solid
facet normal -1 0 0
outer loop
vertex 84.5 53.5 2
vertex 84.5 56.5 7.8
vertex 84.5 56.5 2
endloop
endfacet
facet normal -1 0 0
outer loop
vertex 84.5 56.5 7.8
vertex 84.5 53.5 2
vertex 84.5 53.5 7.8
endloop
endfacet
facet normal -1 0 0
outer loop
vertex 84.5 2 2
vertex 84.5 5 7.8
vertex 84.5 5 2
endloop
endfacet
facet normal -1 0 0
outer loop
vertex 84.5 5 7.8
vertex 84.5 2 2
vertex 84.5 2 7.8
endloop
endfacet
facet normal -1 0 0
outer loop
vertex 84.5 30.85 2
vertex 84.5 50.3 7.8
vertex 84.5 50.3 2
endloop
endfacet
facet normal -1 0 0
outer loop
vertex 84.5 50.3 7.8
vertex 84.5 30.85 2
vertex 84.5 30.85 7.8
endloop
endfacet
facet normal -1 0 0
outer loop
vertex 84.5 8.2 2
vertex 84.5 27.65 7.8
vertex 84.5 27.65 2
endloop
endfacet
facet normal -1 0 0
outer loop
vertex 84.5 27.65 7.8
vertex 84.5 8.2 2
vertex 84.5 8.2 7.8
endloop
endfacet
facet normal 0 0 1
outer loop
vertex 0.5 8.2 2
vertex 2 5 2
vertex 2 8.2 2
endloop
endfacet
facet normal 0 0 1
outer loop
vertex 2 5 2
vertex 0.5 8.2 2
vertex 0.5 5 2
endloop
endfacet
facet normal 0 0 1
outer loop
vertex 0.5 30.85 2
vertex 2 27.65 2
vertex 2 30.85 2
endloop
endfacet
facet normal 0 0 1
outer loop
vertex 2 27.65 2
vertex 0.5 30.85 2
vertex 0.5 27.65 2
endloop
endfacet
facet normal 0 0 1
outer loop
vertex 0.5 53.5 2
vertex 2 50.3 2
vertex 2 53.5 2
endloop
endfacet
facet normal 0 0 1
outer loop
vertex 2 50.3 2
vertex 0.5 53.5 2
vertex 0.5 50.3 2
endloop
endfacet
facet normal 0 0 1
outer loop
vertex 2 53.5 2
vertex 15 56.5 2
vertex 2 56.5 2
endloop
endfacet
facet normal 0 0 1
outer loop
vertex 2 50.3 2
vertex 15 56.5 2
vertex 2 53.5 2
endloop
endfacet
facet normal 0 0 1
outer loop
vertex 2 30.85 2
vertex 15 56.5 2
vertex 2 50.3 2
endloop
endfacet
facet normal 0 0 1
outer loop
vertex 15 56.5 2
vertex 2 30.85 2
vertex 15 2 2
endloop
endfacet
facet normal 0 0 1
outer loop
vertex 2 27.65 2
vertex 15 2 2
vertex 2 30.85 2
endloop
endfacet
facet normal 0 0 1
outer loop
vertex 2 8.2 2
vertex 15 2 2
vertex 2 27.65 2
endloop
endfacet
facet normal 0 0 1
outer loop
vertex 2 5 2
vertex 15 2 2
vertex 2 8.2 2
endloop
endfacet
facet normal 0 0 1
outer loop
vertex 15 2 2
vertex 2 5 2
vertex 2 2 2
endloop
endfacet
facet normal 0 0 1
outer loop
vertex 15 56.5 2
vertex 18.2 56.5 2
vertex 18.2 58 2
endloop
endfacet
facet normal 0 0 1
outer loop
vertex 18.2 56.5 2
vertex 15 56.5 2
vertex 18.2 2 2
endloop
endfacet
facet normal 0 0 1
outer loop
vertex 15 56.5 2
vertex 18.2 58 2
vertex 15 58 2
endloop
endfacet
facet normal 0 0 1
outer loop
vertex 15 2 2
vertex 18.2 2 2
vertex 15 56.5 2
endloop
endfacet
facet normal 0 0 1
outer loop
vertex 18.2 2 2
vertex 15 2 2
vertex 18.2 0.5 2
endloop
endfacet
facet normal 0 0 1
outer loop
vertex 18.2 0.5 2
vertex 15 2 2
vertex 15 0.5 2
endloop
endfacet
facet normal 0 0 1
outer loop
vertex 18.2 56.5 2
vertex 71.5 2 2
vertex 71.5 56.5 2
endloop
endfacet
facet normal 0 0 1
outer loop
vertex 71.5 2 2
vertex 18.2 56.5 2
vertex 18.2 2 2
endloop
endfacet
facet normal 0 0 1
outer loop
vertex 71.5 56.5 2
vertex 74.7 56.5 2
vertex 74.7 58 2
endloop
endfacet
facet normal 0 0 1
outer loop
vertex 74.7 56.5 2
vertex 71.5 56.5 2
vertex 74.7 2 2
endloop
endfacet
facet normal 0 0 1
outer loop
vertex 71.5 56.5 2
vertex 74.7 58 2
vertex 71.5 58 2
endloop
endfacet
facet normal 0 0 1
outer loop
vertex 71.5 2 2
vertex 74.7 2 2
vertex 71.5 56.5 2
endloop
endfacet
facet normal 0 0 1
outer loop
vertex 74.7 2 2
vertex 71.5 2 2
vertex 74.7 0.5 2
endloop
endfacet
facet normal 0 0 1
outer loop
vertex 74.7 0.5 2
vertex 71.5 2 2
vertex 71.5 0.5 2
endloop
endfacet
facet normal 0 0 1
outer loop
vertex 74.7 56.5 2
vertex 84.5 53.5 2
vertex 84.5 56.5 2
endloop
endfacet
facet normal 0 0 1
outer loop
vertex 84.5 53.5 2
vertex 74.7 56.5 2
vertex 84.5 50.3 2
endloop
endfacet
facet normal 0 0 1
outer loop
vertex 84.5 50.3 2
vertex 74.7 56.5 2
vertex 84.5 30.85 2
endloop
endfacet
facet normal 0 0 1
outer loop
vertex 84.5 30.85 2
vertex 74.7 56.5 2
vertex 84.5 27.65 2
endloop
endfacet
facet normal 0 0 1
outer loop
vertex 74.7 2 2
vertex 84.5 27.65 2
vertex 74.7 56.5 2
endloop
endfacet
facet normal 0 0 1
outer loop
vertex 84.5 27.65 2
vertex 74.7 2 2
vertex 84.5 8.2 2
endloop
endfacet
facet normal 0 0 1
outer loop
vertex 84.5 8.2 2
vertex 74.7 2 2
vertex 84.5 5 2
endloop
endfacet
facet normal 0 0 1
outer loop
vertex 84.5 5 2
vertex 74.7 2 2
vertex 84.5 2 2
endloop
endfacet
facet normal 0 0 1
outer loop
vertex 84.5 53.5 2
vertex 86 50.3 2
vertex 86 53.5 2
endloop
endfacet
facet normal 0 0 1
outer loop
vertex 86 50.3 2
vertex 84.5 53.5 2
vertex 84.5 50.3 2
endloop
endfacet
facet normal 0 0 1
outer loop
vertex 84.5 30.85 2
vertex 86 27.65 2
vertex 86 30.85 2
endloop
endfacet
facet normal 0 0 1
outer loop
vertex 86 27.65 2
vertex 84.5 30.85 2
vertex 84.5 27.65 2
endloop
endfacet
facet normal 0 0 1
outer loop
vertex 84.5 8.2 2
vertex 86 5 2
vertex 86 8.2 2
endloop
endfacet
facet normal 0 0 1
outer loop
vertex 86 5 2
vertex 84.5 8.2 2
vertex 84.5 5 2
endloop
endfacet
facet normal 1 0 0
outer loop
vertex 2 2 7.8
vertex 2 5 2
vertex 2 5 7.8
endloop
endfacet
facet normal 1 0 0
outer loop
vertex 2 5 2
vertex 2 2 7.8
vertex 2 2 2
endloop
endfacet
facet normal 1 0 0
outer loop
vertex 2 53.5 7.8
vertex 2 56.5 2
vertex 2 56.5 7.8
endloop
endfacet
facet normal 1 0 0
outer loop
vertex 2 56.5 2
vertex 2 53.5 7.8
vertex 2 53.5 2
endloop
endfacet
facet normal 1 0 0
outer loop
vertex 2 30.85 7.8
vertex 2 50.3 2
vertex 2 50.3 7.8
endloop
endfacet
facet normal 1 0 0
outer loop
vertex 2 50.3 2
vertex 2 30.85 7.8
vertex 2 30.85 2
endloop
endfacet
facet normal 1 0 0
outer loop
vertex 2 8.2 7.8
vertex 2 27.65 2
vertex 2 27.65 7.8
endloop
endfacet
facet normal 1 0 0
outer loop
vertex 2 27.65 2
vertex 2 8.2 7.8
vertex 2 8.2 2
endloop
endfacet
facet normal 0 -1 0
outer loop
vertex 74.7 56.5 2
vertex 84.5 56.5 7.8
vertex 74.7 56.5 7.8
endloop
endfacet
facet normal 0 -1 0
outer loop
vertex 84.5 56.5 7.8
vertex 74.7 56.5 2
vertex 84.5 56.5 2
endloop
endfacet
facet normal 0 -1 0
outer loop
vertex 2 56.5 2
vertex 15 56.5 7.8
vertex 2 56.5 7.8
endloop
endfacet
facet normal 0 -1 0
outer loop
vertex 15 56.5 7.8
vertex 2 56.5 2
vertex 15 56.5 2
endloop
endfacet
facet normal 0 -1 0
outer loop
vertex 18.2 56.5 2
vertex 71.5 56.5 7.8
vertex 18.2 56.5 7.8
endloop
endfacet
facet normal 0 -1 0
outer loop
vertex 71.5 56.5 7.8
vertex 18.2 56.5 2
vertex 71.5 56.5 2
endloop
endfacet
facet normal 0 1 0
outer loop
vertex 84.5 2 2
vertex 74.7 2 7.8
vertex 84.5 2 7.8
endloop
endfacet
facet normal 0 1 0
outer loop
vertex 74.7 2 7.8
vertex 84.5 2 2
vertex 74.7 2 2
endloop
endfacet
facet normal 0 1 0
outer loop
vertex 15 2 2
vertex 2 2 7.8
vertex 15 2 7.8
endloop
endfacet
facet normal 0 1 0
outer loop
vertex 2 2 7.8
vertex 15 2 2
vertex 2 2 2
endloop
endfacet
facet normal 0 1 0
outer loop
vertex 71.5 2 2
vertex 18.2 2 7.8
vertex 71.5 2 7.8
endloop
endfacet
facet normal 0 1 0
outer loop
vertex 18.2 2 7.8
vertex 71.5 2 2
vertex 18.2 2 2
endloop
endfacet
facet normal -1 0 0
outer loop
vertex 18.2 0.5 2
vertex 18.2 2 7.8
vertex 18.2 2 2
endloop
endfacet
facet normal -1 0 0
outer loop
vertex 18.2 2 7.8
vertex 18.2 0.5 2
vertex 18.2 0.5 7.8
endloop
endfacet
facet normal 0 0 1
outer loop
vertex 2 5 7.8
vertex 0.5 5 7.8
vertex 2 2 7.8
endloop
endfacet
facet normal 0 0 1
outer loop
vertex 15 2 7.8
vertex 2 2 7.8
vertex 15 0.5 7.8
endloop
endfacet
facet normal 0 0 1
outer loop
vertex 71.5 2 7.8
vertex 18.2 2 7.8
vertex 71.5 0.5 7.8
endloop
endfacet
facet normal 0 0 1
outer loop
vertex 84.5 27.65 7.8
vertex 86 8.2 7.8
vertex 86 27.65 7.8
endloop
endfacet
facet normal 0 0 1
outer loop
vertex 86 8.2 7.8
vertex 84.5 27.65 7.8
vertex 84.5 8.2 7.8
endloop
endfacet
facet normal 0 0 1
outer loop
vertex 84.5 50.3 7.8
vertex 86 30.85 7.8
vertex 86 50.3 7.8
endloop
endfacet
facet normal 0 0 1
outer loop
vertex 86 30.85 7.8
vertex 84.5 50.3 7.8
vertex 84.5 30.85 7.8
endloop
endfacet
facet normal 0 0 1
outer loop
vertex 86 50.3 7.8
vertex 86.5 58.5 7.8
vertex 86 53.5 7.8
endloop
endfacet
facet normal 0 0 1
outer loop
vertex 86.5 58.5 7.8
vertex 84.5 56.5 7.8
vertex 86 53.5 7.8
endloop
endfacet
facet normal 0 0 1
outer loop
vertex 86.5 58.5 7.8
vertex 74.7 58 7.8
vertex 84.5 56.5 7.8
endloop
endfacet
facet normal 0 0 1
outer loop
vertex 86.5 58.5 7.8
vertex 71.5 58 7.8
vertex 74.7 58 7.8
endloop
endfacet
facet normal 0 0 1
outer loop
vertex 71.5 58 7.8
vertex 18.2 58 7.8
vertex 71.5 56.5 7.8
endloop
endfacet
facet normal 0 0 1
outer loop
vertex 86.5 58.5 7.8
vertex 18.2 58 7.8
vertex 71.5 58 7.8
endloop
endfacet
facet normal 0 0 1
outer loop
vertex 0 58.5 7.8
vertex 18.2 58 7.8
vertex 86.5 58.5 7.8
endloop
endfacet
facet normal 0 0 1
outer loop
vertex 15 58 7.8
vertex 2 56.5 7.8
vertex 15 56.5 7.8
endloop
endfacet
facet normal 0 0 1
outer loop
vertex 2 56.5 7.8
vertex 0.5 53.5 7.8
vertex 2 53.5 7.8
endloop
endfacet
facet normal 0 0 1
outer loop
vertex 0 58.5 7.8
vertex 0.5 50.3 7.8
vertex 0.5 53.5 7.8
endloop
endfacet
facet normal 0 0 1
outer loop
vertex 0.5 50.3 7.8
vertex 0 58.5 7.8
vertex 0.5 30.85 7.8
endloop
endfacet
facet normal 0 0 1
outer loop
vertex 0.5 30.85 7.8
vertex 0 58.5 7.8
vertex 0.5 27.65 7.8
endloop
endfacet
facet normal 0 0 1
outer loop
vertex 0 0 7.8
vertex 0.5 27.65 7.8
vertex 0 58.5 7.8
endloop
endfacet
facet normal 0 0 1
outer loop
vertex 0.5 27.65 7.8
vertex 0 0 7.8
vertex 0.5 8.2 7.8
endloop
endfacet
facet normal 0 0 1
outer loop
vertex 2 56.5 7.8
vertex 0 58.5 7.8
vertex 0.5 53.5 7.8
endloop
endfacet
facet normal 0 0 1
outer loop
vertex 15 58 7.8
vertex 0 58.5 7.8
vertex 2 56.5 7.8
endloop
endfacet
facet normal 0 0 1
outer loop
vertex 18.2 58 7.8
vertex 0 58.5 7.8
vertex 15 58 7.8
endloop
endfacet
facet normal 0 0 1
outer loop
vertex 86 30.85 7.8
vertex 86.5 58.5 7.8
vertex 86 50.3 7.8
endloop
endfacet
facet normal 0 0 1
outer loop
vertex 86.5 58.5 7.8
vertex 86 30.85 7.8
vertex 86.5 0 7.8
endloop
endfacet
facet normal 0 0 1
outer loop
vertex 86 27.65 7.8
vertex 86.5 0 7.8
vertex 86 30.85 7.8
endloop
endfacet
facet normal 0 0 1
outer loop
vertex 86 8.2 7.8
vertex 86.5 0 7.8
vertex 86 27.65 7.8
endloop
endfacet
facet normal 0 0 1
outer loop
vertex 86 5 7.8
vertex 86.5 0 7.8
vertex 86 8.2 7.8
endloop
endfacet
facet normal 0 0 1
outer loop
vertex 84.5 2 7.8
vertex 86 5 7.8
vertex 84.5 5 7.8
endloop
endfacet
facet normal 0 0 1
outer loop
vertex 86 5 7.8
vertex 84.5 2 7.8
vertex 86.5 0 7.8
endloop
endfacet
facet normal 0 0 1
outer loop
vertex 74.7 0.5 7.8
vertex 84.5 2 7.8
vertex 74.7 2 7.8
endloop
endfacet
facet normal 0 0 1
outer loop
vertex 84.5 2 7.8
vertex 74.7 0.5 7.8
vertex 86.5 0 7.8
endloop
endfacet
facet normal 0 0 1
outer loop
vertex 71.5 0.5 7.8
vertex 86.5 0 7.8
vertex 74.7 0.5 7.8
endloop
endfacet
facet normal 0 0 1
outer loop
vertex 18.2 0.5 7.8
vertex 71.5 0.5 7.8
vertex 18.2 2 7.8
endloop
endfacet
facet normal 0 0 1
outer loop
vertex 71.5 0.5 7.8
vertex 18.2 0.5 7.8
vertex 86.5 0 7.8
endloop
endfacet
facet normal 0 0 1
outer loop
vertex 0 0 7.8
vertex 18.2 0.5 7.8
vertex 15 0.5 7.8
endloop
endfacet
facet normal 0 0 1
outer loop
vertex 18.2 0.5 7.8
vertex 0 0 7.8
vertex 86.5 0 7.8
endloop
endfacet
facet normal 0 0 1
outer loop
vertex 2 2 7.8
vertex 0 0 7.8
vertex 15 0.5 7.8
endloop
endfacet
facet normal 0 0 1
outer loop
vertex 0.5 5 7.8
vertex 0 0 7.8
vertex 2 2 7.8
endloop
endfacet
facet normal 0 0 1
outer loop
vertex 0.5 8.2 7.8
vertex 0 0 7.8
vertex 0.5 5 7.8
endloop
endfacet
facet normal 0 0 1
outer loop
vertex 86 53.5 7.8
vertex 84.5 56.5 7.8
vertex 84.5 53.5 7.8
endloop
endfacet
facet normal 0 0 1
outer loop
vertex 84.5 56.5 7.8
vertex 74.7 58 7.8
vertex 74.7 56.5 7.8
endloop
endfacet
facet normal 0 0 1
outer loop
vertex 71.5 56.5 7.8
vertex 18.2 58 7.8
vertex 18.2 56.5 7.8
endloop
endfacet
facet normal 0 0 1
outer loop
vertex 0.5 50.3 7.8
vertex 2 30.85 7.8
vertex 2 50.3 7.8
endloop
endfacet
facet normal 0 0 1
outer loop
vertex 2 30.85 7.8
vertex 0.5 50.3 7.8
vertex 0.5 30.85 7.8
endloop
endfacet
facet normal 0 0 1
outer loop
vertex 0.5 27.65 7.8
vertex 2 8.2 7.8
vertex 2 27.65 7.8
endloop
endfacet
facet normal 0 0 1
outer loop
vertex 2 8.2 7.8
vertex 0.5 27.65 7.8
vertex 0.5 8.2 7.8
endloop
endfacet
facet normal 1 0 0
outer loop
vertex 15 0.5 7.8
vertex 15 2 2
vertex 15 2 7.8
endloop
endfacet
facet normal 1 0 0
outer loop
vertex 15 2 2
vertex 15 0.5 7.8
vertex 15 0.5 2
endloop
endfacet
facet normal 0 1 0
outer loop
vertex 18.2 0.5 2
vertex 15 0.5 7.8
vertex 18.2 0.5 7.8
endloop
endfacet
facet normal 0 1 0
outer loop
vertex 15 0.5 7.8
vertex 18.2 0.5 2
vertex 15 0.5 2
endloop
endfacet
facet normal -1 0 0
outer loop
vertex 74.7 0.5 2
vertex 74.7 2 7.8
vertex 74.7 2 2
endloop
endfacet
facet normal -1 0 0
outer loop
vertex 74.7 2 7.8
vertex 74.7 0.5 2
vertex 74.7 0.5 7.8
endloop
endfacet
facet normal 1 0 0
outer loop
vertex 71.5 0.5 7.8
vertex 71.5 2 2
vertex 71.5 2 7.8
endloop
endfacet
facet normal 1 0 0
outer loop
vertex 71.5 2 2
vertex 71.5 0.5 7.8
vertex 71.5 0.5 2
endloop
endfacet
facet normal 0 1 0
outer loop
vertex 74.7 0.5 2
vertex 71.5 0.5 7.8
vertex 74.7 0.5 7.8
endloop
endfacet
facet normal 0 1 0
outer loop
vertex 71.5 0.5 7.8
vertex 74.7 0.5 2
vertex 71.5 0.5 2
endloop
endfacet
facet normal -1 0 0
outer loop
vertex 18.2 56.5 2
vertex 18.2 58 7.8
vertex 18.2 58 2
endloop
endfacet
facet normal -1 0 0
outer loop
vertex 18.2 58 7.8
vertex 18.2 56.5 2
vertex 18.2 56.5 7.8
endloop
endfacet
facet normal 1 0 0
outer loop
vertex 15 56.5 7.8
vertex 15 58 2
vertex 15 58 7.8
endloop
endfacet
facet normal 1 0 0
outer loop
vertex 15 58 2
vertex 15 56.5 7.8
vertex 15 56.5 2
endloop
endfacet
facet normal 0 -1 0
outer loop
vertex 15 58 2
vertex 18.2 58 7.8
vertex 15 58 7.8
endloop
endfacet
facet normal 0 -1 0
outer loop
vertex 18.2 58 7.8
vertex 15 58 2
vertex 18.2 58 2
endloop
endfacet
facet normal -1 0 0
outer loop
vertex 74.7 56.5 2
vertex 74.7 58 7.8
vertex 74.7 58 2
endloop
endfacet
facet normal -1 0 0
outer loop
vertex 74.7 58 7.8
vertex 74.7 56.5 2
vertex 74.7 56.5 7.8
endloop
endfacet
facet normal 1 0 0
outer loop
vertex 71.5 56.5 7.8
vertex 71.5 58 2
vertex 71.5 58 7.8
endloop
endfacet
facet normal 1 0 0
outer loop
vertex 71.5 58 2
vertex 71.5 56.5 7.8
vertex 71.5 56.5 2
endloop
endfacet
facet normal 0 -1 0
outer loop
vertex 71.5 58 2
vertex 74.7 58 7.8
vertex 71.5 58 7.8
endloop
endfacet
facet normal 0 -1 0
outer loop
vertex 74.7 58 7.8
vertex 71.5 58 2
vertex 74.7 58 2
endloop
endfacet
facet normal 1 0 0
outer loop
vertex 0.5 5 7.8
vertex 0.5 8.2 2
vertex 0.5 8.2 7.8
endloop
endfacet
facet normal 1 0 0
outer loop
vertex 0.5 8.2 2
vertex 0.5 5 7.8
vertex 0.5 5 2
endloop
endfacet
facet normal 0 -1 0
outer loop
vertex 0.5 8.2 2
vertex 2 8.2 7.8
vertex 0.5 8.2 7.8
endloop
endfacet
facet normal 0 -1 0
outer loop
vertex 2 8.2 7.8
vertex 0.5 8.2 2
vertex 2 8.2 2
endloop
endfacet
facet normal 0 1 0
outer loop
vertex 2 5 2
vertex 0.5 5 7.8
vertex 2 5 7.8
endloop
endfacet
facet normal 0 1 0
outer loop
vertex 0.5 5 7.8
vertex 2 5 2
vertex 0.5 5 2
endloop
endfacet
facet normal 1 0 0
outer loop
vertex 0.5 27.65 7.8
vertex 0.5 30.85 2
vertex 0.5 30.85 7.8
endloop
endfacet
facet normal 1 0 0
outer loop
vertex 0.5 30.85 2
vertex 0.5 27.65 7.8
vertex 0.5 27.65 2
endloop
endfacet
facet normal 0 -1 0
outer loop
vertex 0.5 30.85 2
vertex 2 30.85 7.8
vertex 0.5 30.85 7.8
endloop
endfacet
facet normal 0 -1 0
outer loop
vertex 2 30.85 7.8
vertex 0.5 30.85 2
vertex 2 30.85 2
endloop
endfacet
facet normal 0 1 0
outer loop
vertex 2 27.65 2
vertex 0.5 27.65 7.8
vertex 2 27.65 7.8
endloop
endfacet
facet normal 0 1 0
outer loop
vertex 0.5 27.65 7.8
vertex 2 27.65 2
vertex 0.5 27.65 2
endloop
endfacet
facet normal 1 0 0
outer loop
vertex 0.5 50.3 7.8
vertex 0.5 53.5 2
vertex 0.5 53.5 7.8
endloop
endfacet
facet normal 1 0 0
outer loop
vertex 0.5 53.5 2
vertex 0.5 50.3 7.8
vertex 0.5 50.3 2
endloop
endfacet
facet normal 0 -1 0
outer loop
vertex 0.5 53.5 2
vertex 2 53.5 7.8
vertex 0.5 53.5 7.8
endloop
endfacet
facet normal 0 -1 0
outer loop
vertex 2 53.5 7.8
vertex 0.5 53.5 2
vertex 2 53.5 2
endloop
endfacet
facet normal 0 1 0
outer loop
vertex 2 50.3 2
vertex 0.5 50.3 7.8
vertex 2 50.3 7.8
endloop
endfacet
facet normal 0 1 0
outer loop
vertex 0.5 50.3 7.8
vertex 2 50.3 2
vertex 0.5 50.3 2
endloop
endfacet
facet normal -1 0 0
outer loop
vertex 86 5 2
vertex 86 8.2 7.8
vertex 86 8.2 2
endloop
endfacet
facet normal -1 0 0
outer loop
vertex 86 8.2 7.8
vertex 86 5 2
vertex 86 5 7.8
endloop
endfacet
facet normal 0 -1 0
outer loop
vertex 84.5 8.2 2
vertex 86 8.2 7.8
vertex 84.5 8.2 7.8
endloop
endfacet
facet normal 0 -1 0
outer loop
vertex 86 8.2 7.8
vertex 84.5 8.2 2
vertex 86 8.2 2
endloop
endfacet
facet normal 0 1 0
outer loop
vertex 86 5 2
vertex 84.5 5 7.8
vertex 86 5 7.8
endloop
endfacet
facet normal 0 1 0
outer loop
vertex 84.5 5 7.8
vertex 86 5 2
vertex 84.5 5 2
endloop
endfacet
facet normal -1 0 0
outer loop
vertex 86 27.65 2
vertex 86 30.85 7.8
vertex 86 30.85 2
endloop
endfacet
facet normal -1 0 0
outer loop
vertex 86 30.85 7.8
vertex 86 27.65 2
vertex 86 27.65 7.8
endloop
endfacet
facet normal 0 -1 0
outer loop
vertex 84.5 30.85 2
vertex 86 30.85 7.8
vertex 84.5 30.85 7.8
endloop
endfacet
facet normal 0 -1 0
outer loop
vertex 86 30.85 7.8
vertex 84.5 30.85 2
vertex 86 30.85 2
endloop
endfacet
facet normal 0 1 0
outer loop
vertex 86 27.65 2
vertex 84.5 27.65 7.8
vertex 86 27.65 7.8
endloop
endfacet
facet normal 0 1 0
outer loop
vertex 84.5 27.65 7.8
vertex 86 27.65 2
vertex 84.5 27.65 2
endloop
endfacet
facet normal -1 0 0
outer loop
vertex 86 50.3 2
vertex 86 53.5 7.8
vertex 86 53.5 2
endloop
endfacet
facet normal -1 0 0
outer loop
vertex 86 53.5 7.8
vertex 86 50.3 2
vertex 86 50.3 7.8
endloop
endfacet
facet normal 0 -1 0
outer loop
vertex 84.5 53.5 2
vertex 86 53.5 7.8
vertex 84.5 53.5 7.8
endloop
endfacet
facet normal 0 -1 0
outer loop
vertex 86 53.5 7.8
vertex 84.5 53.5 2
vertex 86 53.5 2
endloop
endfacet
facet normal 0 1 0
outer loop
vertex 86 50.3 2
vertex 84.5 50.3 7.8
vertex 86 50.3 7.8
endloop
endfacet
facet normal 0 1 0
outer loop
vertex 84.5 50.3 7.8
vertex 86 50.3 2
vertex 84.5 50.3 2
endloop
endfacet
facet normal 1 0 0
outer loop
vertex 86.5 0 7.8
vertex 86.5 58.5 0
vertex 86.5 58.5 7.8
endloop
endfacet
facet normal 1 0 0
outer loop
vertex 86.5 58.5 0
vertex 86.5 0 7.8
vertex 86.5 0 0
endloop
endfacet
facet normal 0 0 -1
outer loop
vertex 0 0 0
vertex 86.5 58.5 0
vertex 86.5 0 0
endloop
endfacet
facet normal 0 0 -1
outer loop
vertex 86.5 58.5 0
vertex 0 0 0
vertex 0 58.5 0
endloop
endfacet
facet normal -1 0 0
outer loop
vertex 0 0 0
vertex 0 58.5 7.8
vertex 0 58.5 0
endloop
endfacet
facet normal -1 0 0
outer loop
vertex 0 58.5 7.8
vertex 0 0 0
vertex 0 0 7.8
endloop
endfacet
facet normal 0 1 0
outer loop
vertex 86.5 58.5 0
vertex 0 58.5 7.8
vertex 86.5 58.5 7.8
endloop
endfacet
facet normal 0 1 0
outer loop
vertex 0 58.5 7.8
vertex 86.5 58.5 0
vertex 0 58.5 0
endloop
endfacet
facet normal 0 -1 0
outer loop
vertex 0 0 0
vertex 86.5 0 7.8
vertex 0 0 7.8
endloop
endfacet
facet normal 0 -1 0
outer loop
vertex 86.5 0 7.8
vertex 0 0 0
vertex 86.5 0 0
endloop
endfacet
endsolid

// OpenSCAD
// file: breadboard.scad
/*
 * Breadboad
 * from: https://github.com/rlerdorf/BBBox
 */

/* [Box dimensions] */
Thick        = 2; // Wall thickness. If you change this you will have to adjust a few things

/* [Box options] */
m           = 0.9; // Tolerance (Panels/rails gap)

/* BreadBoard Mount */
BBMount   =  1;

BBPosX    = 2;
BBPosY    = 2;
BBLength  = 82.5;
BBHeight  =  9.5;
BBWidth   = 54.5;
TabWidth  =  3.2; // These tabs tend to vary from one brand to another. Measure carefully!
TabDepth  =  1.5;
TabHeight =  5.8;

module BBTabs() {
    //translate([Thick+2*m + 0.1, 2*Thick, Thick+0.2]) {
        union() {
            cube([BBLength, BBWidth, BBHeight]);
            translate([13, -TabDepth, 0]) {
                cube([TabWidth, TabDepth*2, TabHeight]);
            }
            translate([BBLength-13, -TabDepth, 0]) {
                cube([TabWidth, TabDepth*2, TabHeight]);
            }
            translate([13, BBWidth-TabDepth, 0]) {
                cube([TabWidth, TabDepth*2, TabHeight]);
            }
            translate([BBLength-13, BBWidth-TabDepth, 0]) {
                cube([TabWidth, TabDepth*2, TabHeight]);
            }
            translate([-TabDepth, 3, 0]) {
                cube([TabDepth*2, TabWidth, TabHeight]);
            }
            translate([-TabDepth, BBWidth/2-TabWidth/2, 0]) {
                cube([TabDepth*2, TabWidth, TabHeight]);
            }
            translate([-TabDepth, BBWidth-TabWidth-3, 0]) {
                cube([TabDepth*2, TabWidth, TabHeight]);
            }
            translate([BBLength-TabDepth, 3, 0]) {
                cube([TabDepth*2, TabWidth, TabHeight]);
            }
            translate([BBLength-TabDepth, BBWidth/2-TabWidth/2, 0]) {
                cube([TabDepth*2, TabWidth, TabHeight]);
            }
            translate([BBLength-TabDepth, BBWidth-TabWidth-3, 0]) {
                cube([TabDepth*2, TabWidth, TabHeight]);
            }
        }
    //}
}

module BB() {
    translate([BBPosX, BBPosY, 0]) {
        BBTabs();
    }
}

if(BBMount==1) {
    translate([BBPosX, BBPosY, 0]) {
        BBTabs();
    }
}
// main file
include <breadboard.scad>

// Don't draw the breadboard
BBMount=0;

module BBTray() {
    difference() {
        cube([BBLength+Thick*2, BBWidth+Thick*2, TabHeight+Thick]);
        translate([0,0,Thick]) {BB();}
        }
    }

BBTray();
    
